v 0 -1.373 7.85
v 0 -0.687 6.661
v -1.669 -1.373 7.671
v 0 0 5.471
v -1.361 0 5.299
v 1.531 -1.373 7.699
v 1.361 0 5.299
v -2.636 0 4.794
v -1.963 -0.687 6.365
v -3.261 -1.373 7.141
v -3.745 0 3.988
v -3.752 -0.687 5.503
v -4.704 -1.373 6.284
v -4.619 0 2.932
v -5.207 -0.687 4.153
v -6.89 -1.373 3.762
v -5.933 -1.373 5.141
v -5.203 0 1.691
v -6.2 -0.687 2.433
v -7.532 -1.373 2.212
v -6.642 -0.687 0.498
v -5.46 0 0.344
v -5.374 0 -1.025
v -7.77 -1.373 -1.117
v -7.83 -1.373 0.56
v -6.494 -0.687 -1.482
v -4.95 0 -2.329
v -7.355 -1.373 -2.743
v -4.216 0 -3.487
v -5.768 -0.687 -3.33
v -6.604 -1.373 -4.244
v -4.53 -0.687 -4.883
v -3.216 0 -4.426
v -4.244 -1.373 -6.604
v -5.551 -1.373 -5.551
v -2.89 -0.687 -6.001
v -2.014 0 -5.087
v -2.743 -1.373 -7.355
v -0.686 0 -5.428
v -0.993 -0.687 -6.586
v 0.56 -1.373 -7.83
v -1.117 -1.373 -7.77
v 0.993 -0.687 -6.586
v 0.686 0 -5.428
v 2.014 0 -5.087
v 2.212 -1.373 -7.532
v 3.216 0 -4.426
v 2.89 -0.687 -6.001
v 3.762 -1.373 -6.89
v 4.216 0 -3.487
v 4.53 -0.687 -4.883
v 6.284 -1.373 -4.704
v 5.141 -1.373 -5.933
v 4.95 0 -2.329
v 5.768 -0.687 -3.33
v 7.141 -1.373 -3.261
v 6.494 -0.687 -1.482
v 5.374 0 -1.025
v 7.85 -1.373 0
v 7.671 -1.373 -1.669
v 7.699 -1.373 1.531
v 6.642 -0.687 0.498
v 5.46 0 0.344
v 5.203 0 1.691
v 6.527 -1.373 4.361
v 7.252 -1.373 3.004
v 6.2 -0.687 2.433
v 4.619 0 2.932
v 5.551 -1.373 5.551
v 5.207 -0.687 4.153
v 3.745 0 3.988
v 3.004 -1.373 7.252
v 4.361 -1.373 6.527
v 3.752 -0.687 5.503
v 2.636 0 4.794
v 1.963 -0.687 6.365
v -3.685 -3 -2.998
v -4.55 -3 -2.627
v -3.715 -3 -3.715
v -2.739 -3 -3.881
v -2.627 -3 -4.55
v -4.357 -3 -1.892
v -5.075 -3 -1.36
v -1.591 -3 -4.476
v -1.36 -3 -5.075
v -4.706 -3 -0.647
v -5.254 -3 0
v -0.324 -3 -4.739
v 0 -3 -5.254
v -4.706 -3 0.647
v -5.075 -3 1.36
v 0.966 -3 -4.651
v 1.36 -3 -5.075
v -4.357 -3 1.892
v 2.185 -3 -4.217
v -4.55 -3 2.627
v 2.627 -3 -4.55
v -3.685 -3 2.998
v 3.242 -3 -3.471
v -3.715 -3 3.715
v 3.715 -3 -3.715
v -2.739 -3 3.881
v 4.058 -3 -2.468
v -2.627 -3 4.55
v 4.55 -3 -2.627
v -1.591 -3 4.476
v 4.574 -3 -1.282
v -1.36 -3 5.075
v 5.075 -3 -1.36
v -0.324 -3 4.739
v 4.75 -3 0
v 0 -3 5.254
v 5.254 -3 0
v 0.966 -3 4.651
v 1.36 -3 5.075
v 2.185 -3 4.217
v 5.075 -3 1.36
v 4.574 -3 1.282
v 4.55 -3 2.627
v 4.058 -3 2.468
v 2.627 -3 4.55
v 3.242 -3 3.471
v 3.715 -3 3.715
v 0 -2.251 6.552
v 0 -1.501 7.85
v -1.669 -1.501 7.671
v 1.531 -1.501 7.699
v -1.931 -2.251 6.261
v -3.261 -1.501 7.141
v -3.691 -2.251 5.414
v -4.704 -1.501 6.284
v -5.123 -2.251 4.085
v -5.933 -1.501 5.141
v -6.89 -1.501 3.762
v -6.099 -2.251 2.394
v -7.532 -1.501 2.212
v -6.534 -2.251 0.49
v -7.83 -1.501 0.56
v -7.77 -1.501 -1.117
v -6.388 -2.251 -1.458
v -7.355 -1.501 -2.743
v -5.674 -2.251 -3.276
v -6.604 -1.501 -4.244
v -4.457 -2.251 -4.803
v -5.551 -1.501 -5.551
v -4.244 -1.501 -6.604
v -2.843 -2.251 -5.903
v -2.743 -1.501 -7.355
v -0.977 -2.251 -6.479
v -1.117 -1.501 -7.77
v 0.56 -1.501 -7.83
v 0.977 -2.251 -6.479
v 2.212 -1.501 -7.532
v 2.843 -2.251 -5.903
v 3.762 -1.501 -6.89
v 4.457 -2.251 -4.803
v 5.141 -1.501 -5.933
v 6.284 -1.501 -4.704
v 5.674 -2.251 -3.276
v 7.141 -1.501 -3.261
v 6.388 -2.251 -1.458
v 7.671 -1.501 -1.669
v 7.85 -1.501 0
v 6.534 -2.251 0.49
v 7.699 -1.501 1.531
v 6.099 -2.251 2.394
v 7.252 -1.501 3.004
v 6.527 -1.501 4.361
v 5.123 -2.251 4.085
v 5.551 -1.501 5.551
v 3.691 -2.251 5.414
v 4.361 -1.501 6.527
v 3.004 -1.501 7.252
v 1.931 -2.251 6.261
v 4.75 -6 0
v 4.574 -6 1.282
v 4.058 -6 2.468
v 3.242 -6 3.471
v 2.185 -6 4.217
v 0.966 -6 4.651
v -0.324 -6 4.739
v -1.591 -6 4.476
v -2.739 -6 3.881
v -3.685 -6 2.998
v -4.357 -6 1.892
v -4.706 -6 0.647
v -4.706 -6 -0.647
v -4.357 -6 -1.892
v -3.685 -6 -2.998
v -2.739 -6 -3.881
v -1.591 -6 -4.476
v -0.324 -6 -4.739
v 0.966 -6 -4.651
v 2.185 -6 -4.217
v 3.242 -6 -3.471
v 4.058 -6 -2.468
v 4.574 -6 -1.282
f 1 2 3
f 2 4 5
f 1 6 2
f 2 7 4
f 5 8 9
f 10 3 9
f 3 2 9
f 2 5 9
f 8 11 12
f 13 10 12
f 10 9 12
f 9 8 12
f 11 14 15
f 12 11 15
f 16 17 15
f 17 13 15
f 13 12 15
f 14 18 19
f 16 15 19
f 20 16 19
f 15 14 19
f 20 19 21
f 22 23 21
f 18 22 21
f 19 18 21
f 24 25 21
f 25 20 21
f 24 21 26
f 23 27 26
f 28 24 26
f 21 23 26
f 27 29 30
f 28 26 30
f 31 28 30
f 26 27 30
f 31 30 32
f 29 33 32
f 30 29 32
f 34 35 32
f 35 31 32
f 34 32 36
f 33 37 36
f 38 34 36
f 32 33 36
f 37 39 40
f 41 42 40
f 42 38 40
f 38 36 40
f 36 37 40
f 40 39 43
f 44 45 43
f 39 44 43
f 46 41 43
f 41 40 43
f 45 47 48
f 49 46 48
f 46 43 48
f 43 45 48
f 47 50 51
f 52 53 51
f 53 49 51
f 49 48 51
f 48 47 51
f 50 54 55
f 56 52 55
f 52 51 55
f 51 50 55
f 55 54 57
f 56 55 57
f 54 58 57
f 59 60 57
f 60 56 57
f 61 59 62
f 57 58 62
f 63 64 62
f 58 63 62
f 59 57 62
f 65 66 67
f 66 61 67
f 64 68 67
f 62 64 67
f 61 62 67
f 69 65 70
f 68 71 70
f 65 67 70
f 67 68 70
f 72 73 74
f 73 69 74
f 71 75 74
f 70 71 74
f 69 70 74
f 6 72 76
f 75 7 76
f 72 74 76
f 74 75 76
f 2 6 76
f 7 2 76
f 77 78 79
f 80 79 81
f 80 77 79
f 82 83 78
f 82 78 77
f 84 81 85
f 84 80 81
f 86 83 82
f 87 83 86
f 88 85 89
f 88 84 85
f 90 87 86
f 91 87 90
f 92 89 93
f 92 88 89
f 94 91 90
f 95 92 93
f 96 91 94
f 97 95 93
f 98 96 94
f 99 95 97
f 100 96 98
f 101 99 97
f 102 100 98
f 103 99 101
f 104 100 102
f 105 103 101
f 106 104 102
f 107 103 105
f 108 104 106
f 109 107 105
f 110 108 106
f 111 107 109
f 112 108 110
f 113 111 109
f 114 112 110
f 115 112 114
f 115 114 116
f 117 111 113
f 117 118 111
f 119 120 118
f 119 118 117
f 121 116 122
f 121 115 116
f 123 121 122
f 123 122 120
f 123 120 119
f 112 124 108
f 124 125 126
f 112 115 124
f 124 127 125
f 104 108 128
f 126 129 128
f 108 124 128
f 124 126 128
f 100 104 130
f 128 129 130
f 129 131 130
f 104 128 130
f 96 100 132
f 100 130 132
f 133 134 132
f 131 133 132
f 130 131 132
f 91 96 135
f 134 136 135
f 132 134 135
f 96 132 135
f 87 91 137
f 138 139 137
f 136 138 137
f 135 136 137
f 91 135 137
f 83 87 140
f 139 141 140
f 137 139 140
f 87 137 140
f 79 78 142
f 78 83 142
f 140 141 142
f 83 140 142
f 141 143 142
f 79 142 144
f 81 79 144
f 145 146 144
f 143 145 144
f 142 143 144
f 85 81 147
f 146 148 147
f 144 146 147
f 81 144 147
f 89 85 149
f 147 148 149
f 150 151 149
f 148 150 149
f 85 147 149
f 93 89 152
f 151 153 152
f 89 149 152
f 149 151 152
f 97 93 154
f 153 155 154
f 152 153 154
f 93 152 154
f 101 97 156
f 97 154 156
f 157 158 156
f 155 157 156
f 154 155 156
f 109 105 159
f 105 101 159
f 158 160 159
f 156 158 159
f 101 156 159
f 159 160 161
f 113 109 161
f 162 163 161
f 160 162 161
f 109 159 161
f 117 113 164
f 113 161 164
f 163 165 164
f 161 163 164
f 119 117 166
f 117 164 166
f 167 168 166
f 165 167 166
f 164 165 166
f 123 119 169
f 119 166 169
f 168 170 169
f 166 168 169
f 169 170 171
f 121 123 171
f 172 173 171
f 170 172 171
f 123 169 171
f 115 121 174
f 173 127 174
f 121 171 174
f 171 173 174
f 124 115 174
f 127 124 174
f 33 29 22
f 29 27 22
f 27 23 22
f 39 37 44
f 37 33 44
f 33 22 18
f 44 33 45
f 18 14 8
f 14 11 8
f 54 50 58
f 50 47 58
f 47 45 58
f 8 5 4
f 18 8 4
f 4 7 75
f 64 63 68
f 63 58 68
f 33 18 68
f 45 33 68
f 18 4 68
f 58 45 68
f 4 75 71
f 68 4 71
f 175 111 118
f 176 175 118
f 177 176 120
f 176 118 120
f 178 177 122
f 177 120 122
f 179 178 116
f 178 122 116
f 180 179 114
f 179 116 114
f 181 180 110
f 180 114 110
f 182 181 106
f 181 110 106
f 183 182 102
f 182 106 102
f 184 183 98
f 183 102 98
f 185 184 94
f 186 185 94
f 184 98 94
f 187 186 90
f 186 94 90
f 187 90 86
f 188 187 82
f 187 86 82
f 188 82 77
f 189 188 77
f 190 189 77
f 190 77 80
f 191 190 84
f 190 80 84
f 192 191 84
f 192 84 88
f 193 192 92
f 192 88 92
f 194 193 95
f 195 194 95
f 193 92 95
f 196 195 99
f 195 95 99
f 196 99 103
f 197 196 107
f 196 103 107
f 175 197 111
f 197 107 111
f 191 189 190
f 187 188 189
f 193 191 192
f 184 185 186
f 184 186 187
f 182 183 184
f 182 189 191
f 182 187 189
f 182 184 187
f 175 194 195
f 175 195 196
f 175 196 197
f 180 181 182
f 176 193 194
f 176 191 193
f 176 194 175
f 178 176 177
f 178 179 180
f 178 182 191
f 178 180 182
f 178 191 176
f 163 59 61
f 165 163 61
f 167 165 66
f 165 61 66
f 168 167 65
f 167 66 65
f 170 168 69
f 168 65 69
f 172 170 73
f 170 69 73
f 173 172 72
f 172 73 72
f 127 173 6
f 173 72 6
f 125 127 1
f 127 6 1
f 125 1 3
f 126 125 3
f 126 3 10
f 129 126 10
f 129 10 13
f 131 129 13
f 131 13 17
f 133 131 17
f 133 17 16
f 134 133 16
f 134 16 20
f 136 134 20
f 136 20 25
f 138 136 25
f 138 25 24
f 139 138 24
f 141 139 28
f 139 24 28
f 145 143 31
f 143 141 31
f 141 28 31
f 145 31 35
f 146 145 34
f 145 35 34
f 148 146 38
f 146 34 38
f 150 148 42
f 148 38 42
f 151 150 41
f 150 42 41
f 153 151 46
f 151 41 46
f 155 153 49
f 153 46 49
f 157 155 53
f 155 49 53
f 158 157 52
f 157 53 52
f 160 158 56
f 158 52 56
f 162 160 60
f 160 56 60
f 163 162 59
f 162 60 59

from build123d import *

# Parameters (mm, degrees)
F0_R     = 7.85
F1_DEPTH = 3
F2_R     = 4.75
F3_DEPTH = 3


with BuildPart() as f1:
    # F0 (on Front) → F1 (new body)
    with BuildSketch(Plane.XZ):
        Circle(F0_R)
    extrude(amount=F1_DEPTH)

    # F2 (on face) → F3 (join)
    with BuildSketch(Plane.XZ.offset(3)):
        Circle(F2_R)
    extrude(amount=F3_DEPTH)

    # F4 (on Right) → F5 (revolve, cut)
    with BuildSketch(Plane.YZ):
        Polygon((-3.140014, 5.011569), (-1.437357, 7.960658), (0.2653, 5.011569), (1.444096, 8.551884), (-3.541981, 9.199427), align=None)
    revolve(axis=Axis((0, -4.799199, 0), (0, -1, 0)), mode=Mode.SUBTRACT)


solid = f1.part
